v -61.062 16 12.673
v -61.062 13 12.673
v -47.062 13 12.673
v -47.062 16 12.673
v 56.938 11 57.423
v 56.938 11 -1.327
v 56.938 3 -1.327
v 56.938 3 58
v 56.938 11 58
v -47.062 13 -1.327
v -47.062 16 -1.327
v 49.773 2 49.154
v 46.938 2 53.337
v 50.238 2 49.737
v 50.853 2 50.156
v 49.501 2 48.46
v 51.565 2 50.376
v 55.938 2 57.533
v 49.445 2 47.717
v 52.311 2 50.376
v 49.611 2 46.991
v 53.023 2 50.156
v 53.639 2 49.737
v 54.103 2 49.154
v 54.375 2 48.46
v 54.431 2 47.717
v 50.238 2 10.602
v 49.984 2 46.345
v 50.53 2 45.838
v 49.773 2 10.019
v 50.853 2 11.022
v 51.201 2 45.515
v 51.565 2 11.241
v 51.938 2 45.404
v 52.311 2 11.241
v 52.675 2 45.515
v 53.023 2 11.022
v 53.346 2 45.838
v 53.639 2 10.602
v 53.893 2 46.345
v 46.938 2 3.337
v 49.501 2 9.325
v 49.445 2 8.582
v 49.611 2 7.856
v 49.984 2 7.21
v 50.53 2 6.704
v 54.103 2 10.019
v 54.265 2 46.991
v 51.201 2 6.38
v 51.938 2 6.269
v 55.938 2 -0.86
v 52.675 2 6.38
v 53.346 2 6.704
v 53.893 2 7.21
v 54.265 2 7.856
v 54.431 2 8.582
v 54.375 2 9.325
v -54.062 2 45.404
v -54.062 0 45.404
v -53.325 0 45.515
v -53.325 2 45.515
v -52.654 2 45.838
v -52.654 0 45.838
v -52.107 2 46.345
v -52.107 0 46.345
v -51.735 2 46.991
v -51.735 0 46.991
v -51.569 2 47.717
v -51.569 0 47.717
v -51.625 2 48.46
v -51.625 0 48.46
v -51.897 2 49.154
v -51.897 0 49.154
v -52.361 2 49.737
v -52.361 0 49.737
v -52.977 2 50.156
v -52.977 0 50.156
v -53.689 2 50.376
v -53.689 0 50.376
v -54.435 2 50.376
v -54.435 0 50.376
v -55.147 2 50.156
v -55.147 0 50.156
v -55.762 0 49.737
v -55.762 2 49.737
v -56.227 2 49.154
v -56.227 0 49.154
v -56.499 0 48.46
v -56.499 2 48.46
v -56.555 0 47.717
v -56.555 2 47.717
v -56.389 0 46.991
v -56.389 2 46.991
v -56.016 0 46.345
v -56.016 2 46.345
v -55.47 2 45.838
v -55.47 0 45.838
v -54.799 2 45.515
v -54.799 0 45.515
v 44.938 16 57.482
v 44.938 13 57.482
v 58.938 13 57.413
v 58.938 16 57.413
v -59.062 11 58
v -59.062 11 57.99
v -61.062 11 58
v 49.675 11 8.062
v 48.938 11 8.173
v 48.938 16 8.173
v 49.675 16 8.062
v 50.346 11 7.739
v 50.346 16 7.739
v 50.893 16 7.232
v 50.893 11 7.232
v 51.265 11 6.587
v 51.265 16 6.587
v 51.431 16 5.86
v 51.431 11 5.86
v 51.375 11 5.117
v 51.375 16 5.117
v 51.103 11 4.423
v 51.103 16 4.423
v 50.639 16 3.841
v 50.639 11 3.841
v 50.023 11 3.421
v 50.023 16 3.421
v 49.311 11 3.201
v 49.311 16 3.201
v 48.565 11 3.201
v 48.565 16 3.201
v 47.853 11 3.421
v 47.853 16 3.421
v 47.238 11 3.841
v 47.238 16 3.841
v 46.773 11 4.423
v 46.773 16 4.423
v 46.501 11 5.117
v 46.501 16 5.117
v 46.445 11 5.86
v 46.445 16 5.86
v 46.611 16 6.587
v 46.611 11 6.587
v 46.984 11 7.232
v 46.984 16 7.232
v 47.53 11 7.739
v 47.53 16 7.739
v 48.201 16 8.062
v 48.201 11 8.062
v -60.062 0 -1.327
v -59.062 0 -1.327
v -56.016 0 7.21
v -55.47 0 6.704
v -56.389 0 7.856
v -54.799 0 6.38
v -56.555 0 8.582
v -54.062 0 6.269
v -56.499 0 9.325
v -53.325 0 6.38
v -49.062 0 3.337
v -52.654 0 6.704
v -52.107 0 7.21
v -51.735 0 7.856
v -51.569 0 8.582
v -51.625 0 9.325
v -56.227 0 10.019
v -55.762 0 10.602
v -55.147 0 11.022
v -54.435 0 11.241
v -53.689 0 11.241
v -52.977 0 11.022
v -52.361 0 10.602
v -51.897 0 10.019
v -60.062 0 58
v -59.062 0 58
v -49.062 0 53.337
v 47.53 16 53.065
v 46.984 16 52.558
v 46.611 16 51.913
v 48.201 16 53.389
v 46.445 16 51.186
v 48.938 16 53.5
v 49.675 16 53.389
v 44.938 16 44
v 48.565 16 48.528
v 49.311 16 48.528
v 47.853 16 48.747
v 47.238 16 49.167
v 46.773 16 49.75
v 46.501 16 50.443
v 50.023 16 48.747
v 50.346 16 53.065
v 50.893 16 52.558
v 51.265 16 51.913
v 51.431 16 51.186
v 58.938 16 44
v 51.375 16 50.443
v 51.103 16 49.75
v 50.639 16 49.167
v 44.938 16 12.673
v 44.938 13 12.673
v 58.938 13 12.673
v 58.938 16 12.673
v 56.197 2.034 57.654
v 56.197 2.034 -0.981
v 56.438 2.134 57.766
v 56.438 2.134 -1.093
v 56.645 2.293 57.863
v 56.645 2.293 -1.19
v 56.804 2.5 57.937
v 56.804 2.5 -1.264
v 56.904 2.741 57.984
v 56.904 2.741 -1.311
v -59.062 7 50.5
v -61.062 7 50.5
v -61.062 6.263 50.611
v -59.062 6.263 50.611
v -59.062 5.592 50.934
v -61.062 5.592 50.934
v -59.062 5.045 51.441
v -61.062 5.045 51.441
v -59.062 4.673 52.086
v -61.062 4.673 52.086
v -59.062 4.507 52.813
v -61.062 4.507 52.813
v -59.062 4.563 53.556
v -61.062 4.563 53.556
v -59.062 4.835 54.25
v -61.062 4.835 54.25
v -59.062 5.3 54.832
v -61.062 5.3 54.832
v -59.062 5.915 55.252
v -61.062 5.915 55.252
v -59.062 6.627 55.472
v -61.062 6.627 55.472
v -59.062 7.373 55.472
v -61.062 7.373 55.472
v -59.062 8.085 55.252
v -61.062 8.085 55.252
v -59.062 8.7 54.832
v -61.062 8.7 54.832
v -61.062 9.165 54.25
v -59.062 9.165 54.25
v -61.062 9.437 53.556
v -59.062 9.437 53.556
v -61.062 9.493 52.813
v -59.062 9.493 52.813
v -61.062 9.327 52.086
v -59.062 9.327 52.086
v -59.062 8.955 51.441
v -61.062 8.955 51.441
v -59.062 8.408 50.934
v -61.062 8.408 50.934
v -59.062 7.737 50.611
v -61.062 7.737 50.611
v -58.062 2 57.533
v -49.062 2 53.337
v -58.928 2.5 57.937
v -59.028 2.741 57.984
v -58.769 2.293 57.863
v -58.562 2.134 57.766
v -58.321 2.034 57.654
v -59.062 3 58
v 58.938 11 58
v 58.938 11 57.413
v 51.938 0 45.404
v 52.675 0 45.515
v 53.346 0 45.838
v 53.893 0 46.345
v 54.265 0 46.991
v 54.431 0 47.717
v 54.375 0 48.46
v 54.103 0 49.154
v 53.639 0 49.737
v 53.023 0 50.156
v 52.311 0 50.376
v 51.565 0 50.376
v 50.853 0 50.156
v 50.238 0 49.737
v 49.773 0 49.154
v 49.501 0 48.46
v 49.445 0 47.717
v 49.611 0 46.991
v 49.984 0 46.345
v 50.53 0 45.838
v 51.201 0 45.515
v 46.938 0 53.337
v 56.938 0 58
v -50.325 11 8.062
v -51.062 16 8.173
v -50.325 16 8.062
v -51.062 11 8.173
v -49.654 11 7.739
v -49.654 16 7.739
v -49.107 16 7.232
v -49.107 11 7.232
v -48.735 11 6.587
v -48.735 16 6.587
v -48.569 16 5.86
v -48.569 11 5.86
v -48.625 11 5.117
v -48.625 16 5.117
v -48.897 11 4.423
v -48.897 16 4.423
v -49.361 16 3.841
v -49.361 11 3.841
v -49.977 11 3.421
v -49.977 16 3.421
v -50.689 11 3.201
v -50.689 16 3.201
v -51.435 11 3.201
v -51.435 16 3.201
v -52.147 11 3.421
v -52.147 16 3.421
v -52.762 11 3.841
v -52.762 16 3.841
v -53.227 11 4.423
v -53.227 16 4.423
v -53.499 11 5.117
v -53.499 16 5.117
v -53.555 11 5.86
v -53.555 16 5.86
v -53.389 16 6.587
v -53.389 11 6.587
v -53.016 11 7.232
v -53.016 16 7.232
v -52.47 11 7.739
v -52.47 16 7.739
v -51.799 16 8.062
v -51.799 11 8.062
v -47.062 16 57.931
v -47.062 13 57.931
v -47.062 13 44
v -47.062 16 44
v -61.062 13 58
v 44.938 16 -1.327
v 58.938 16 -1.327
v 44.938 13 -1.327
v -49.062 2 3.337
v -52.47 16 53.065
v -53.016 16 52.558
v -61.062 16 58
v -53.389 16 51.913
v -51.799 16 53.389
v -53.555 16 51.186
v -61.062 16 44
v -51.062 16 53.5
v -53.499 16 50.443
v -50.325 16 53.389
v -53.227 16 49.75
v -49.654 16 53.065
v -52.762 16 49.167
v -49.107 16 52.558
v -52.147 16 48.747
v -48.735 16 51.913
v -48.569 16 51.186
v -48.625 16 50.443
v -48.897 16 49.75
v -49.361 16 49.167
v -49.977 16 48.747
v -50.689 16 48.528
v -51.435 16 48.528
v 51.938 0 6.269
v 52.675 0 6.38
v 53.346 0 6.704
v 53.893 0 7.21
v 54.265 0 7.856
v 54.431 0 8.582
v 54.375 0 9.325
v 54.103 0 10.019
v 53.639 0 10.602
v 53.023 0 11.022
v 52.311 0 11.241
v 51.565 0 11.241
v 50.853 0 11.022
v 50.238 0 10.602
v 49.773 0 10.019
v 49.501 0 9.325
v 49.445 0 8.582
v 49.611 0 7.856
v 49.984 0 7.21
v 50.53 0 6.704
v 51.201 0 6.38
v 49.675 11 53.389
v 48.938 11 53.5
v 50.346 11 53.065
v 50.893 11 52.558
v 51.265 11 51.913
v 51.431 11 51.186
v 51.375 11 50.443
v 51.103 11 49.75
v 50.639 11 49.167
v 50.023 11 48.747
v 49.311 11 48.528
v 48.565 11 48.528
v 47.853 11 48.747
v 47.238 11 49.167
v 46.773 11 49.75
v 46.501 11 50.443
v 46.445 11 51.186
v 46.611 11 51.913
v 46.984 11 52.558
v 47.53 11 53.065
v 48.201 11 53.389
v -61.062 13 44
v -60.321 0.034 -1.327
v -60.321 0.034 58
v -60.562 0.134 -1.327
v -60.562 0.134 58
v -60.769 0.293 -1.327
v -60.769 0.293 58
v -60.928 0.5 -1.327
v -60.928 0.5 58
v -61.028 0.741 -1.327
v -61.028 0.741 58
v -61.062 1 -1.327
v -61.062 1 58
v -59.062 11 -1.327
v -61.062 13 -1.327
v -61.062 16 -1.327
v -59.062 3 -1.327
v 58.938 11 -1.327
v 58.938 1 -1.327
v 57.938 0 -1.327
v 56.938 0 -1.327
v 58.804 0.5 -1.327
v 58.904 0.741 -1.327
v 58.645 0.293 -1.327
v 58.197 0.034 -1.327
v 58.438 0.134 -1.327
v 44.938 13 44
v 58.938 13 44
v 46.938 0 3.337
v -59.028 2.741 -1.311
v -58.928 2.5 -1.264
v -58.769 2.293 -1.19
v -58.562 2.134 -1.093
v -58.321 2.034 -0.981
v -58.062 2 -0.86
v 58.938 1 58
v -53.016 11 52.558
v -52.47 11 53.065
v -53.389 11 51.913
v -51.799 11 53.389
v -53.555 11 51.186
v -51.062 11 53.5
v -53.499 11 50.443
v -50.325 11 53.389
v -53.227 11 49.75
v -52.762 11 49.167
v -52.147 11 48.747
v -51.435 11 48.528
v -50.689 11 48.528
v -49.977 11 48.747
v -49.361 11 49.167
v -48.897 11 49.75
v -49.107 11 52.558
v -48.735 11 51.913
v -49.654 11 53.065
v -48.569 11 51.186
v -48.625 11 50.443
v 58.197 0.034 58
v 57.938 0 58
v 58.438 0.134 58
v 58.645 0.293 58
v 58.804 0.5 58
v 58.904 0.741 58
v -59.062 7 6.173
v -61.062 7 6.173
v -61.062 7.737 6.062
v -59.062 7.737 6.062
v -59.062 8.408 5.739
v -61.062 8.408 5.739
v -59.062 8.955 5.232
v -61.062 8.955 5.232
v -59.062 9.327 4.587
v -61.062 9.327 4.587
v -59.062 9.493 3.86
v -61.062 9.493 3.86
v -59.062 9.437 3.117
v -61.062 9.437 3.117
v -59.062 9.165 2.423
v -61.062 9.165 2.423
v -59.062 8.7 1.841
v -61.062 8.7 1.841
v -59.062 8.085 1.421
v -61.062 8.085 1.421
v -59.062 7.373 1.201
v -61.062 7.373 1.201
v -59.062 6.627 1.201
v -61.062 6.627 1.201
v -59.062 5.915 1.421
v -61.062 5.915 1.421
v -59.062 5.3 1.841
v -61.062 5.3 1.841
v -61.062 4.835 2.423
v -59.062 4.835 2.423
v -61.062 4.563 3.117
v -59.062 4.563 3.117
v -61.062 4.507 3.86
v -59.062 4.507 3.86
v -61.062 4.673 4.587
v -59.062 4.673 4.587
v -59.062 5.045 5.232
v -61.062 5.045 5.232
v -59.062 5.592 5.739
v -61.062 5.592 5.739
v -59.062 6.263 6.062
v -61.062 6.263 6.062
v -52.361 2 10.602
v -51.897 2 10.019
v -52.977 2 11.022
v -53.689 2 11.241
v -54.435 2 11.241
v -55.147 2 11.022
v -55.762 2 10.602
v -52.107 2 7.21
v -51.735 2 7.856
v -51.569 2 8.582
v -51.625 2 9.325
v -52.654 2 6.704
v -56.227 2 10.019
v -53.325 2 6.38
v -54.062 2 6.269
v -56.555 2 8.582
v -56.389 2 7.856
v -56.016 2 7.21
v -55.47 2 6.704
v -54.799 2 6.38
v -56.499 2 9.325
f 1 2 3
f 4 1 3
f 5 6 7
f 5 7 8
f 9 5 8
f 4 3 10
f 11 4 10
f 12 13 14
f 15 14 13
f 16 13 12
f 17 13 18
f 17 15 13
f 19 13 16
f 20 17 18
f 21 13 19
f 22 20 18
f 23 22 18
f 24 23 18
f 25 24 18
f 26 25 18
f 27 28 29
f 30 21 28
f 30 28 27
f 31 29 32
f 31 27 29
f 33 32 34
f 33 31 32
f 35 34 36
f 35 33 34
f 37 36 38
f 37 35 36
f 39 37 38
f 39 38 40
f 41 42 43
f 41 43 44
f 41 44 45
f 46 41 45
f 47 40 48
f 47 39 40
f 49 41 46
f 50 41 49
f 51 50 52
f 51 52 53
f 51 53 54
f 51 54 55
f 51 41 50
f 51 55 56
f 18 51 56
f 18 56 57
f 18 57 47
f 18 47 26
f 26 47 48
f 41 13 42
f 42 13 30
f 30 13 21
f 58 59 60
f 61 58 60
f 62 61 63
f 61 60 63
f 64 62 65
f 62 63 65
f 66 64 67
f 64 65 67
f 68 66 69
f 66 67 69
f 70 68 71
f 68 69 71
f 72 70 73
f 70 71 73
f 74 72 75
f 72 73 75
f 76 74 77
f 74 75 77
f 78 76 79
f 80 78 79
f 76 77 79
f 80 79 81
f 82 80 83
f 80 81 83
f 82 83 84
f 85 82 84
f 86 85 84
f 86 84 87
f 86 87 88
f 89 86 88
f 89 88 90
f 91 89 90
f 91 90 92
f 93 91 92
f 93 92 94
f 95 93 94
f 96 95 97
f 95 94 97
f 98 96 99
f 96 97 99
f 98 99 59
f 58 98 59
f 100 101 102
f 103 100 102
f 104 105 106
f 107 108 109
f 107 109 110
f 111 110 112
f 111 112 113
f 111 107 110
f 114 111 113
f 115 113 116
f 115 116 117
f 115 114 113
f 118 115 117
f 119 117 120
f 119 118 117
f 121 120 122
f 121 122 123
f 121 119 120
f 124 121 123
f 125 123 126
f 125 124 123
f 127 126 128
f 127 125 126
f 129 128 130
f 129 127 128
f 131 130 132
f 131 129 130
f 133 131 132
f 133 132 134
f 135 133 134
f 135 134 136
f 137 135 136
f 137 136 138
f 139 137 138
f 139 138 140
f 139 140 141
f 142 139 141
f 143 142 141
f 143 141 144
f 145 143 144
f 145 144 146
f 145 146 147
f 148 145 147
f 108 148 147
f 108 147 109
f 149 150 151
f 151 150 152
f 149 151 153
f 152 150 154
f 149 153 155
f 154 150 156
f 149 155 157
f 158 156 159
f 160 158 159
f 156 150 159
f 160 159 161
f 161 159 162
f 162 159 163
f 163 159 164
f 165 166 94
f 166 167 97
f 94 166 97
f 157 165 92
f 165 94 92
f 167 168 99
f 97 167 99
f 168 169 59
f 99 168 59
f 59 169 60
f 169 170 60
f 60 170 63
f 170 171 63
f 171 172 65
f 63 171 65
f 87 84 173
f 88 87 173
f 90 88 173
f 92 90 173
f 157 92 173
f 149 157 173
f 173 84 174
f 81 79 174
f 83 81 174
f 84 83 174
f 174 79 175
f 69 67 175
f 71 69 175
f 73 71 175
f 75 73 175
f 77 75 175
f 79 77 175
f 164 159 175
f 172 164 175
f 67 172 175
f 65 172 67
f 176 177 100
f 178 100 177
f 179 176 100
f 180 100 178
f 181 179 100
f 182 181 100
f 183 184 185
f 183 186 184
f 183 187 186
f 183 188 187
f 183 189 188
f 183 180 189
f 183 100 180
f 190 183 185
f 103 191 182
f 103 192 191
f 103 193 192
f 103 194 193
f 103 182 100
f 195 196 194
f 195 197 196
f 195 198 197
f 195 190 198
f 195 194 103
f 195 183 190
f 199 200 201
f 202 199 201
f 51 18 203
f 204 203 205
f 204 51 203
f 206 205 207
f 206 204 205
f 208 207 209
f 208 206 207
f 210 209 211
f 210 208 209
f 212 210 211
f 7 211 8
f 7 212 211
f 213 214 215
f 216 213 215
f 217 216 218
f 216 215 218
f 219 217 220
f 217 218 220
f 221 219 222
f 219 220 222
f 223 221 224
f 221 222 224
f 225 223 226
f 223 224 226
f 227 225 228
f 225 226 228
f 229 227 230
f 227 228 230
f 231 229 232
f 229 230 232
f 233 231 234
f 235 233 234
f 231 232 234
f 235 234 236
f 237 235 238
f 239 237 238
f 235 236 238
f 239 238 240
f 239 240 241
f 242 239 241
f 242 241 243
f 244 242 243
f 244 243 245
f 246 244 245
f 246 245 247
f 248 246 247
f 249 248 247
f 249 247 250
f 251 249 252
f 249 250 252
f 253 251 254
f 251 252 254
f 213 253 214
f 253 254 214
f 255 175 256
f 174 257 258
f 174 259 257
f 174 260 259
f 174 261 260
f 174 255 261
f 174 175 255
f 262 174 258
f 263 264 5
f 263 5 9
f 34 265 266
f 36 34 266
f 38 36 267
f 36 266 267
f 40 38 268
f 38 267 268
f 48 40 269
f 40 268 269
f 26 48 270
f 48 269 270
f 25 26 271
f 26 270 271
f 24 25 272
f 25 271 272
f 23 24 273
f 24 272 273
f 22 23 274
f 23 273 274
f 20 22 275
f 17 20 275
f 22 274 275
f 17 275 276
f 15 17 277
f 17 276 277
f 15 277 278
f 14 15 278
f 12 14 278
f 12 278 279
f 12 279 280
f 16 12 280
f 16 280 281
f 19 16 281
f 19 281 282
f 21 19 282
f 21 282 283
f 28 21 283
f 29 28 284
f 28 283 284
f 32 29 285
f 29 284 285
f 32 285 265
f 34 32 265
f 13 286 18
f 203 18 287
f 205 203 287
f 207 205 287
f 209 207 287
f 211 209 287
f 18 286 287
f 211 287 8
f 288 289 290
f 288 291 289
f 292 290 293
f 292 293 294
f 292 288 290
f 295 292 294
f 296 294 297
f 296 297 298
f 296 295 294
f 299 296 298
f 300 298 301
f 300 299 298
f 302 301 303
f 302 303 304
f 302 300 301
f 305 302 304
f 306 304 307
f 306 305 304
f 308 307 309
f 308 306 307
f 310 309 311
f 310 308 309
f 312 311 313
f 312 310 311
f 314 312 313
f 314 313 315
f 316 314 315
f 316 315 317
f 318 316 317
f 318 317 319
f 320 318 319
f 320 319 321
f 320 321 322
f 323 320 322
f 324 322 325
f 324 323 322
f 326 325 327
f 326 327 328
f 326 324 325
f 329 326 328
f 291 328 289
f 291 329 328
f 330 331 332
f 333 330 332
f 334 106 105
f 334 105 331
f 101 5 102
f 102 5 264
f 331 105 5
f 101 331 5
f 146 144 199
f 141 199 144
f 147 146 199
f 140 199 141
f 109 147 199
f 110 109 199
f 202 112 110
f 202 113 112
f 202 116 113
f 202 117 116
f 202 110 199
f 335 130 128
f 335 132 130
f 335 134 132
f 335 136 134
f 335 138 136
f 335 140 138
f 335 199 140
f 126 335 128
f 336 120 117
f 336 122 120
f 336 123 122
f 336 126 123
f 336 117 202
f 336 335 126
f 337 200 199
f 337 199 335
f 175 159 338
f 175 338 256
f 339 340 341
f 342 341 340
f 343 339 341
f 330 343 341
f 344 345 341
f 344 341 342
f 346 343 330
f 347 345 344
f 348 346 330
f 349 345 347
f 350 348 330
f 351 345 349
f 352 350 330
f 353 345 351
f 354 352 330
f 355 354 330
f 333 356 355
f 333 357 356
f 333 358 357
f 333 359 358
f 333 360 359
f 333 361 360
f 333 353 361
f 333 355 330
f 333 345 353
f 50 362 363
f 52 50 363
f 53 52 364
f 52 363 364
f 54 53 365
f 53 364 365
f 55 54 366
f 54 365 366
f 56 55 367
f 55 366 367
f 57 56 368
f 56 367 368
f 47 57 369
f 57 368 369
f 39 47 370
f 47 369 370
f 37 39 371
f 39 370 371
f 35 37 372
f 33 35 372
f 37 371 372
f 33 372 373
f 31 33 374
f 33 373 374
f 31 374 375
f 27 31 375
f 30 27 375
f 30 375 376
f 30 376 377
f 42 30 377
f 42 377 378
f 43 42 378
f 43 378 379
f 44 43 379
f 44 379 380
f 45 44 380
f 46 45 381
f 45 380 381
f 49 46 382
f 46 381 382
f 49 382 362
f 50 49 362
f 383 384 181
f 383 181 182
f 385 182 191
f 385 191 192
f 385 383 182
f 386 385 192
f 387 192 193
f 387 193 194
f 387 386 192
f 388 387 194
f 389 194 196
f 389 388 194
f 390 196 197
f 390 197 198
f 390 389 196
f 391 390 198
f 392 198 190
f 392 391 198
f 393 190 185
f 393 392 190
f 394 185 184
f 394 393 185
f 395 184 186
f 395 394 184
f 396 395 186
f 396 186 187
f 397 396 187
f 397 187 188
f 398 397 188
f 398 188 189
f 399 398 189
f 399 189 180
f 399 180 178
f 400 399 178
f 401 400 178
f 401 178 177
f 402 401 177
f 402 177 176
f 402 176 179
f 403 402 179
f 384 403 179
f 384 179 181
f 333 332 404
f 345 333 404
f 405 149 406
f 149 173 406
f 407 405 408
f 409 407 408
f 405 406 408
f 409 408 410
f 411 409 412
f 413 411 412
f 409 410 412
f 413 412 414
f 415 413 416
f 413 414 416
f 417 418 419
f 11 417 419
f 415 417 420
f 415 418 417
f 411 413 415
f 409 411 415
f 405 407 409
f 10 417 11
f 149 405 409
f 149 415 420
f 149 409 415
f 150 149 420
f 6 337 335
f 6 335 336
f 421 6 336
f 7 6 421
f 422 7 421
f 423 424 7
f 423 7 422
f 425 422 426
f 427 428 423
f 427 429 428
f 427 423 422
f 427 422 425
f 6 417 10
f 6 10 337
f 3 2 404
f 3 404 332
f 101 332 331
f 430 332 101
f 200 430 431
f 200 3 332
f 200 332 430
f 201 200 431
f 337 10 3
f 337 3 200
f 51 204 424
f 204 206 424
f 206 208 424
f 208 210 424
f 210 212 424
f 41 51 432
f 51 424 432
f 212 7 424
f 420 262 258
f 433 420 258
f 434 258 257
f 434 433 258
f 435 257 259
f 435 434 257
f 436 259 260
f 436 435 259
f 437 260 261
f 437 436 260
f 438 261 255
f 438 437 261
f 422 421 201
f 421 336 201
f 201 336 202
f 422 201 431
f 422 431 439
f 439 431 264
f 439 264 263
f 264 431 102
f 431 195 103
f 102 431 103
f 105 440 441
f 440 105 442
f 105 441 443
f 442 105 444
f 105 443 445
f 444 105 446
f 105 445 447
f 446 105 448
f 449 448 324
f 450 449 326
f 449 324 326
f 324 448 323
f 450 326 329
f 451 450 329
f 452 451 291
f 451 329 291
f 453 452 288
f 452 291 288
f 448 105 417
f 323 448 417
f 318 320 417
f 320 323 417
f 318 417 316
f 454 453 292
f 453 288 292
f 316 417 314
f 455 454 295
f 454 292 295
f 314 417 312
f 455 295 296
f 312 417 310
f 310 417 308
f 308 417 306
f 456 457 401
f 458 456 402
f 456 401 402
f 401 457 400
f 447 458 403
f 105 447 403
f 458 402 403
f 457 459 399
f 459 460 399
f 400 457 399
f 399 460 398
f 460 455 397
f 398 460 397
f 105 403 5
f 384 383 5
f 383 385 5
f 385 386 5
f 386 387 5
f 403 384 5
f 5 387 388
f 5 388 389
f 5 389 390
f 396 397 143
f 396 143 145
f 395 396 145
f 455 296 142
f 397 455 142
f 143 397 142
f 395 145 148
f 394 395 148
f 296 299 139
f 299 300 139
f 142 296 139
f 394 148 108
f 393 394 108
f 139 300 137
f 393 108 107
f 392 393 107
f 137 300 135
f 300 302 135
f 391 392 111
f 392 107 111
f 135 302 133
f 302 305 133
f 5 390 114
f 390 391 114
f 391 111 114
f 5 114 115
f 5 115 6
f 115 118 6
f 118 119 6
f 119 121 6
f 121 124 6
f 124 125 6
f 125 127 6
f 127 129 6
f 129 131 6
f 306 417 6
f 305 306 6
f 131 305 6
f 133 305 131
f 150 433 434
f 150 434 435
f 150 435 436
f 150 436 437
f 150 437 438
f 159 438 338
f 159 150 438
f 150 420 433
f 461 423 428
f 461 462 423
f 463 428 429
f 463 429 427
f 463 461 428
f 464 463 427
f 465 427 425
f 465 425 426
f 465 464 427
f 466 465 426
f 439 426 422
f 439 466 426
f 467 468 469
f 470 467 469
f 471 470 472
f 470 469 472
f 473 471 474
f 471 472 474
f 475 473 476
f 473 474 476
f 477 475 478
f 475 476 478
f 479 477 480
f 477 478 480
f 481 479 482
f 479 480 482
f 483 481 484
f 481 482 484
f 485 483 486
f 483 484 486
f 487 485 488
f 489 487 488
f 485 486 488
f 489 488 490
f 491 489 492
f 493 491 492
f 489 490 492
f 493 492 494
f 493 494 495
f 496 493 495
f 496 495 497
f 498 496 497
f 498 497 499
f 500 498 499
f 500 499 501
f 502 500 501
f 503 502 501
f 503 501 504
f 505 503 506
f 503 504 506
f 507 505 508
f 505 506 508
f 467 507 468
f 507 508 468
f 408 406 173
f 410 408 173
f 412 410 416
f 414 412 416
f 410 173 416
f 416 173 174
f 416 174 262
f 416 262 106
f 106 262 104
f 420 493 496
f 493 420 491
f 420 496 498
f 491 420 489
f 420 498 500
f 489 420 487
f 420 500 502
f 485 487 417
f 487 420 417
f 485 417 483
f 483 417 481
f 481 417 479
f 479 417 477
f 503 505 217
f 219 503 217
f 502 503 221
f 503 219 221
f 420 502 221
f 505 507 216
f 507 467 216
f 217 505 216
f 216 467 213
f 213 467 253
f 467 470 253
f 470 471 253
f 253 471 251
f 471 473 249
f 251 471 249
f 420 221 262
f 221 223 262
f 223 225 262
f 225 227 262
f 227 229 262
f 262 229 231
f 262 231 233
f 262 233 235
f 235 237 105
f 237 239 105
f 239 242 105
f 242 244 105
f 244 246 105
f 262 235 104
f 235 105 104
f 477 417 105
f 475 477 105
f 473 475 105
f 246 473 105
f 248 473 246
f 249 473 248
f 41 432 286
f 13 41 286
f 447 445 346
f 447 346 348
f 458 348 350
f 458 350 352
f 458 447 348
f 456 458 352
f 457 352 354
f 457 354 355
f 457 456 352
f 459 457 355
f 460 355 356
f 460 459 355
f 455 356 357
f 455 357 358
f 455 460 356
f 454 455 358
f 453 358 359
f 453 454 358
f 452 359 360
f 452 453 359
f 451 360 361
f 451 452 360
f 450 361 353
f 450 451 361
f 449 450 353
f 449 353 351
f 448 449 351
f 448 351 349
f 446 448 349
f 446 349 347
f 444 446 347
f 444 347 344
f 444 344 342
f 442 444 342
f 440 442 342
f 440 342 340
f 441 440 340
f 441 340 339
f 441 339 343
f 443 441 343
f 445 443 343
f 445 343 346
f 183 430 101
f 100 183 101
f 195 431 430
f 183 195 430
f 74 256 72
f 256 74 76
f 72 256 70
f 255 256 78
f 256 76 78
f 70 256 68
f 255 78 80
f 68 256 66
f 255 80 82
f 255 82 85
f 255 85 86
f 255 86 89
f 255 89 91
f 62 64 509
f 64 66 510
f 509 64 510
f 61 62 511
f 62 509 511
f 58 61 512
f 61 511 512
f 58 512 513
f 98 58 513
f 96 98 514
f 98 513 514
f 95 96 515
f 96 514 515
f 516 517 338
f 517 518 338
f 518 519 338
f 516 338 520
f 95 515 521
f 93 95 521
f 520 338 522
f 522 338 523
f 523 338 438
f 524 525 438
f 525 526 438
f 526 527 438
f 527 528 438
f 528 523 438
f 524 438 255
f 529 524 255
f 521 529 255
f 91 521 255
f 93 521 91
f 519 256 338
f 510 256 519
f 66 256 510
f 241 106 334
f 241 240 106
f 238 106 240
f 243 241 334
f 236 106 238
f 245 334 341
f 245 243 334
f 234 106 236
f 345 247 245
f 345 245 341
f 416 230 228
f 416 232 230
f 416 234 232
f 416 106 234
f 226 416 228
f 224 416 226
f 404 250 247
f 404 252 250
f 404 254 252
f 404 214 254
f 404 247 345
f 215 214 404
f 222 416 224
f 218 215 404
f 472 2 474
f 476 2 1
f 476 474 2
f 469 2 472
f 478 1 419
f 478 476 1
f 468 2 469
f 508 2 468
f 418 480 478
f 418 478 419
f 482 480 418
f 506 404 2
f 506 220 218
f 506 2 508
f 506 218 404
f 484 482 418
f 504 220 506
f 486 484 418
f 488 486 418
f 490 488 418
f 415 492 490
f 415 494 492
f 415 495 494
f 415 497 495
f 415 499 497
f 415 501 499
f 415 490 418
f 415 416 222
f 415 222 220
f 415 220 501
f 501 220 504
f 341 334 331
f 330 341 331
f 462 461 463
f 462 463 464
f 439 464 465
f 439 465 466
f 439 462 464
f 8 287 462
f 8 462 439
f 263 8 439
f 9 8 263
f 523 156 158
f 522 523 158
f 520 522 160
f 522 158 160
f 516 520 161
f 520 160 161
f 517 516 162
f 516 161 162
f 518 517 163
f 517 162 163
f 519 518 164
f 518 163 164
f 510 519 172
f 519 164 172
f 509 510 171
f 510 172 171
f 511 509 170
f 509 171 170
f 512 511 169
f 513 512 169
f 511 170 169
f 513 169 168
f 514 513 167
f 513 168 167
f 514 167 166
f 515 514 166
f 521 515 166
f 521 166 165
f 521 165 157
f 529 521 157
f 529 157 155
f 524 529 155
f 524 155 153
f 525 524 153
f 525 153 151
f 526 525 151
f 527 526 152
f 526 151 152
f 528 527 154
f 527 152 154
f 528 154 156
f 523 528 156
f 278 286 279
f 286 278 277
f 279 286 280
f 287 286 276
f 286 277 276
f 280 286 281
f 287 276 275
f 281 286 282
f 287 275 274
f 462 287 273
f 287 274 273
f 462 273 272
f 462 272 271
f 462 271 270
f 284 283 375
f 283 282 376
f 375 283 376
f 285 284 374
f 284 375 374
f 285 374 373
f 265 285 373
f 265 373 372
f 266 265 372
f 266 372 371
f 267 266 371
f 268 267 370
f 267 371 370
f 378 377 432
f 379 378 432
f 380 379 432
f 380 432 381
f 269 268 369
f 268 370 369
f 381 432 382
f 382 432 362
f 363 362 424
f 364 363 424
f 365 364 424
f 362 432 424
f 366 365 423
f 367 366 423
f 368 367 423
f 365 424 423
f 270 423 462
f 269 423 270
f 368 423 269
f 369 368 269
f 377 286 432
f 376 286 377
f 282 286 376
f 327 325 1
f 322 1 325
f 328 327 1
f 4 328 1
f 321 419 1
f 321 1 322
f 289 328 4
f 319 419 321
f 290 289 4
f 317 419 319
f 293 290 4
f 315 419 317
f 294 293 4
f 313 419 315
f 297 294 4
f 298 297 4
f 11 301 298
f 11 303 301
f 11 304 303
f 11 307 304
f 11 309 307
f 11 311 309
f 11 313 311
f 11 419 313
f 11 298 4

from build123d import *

# Parameters (mm, degrees)
BOSS_EXTRUDE1_DEPTH = 2
SKETCH2_W           = 59.326153163
SKETCH2_H           = 11
BOSS_EXTRUDE2_DEPTH = 2
FILLET1_R           = 1
SKETCH3_R           = 2.5
BOSS_EXTRUDE3_DEPTH = 2
FILLET3_R           = 1
SKETCH4_R           = 2.5
CUT_EXTRUDE1_DEPTH  = 2
BOSS_EXTRUDE5_START = 2
SKETCH3_5_W         = 14
SKETCH3_5_H         = 14
SKETCH3_5_R         = 2.5
BOSS_EXTRUDE5_DEPTH = 3
SKETCH5_R           = 2.5
CUT_EXTRUDE2_DEPTH  = 2


with BuildPart() as part:
    # Sketch1 → Boss-Extrude1 (new body)
    with BuildSketch(Plane(origin=(0, 0, 0), x_dir=(1, 0, 0), z_dir=(0, 1, 0))):
        Polygon((-49.061898328, -3.336557388), (-49.061898328, -53.336557388), (-59.061898328, -57.999633969), (-59.061898328, 1.326519194), align=None)
    boss_extrude1 = extrude(amount=BOSS_EXTRUDE1_DEPTH)

    # Sketch2 → Boss-Extrude2 (add)
    with BuildSketch(Plane.ZY.offset(59.061898328)):
        with Locations((28.336557388, 5.5)):
            Rectangle(SKETCH2_W, SKETCH2_H)
    boss_extrude2 = extrude(amount=BOSS_EXTRUDE2_DEPTH)

    # Fillet1
    fillet1_edges = [part.edges().sort_by_distance(p)[0] for p in [
        (-61.061898328, 0, 28.336557388),
        (-59.061898328, 2, 28.336557388),
    ]]
    fillet(fillet1_edges, radius=FILLET1_R)

    # Sketch3 → Boss-Extrude3 (add)
    with BuildSketch(Plane(origin=(0, 11, 0), x_dir=(1, 0, 0), z_dir=(0, 1, 0))):
        Polygon((-61.061898328, 1.326519194), (-61.061898328, -57.999633969), (58.938101672, -57.413440129), (58.938101672, 1.326519194), align=None)
        with Locations(Location((-51.061898328, -5.673480806, 0), (0, 0, 270))):
            Circle(SKETCH3_R, mode=Mode.SUBTRACT)
        with Locations(Location((48.938101672, -5.673480806, 0), (0, 0, 270))):
            Circle(SKETCH3_R, mode=Mode.SUBTRACT)
        with Locations(Location((-51.061898328, -50.999633969, 0), (0, 0, 270))):
            Circle(SKETCH3_R, mode=Mode.SUBTRACT)
        with Locations(Location((48.938101672, -50.999633969, 0), (0, 0, 270))):
            Circle(SKETCH3_R, mode=Mode.SUBTRACT)
    extrude(amount=BOSS_EXTRUDE3_DEPTH)

    # Mirror1: Boss-Extrude2 across plane
    add(boss_extrude2.mirror(Plane.ZY.offset(1.061898328)))

    # Mirror2: Boss-Extrude1 across plane
    add(boss_extrude1.mirror(Plane.ZY.offset(1.061898328)))

    # Fillet3
    fillet3_edges = [part.edges().sort_by_distance(p)[0] for p in [
        (58.938101672, 0, 28.336557388),
        (56.938101672, 2, 28.336557388),
    ]]
    fillet(fillet3_edges, radius=FILLET3_R)

    # Sketch4 → Cut-Extrude1 (cut)
    with BuildSketch(Plane.ZY.offset(61.061898328)):
        with Locations((3.673480806, 7)):
            Circle(SKETCH4_R)
        with Locations(Location((52.999633969, 7, 0), (0, 0, 180))):
            Circle(SKETCH4_R)
    extrude(amount=-CUT_EXTRUDE1_DEPTH, mode=Mode.SUBTRACT)

    # Sketch3<5> → Boss-Extrude5 (add)
    # profile 1 of 4: a face of its own
    with BuildSketch(Plane(origin=(0, 11, 0), x_dir=(1, 0, 0), z_dir=(0, 1, 0)).offset(BOSS_EXTRUDE5_START)):
        with Locations((-54.061898328, -5.673480806)):
            Rectangle(SKETCH3_5_W, SKETCH3_5_H)
        with Locations(Location((-51.061898328, -5.673480806, 0), (0, 0, 270))):
            Circle(SKETCH3_5_R, mode=Mode.SUBTRACT)
    # profile 2 of 4: a face of its own
    with BuildSketch(Plane(origin=(0, 11, 0), x_dir=(1, 0, 0), z_dir=(0, 1, 0)).offset(BOSS_EXTRUDE5_START)):
        with Locations((51.938101672, -5.673480806)):
            Rectangle(SKETCH3_5_W, SKETCH3_5_H)
        with Locations(Location((48.938101672, -5.673480806, 0), (0, 0, 270))):
            Circle(SKETCH3_5_R, mode=Mode.SUBTRACT)
    # profile 3 of 4: a face of its own
    with BuildSketch(Plane(origin=(0, 11, 0), x_dir=(1, 0, 0), z_dir=(0, 1, 0)).offset(BOSS_EXTRUDE5_START)):
        Polygon((-47.061898328, -43.999633969), (-61.061898328, -43.999633969), (-61.061898328, -57.999633969), (-47.061898328, -57.931244688), align=None)
        with Locations(Location((-51.061898328, -50.999633969, 0), (0, 0, 270))):
            Circle(SKETCH3_5_R, mode=Mode.SUBTRACT)
    # profile 4 of 4: a face of its own
    with BuildSketch(Plane(origin=(0, 11, 0), x_dir=(1, 0, 0), z_dir=(0, 1, 0)).offset(BOSS_EXTRUDE5_START)):
        Polygon((58.938101672, -57.413440129), (58.938101672, -43.999633969), (44.938101672, -43.999633969), (44.938101672, -57.481829411), align=None)
        with Locations(Location((48.938101672, -50.999633969, 0), (0, 0, 270))):
            Circle(SKETCH3_5_R, mode=Mode.SUBTRACT)
    extrude(amount=BOSS_EXTRUDE5_DEPTH)

    # Sketch5 → Cut-Extrude2 (cut)
    with BuildSketch(Plane.XZ):
        with Locations(Location((-54.061898328, 47.903918034, 0), (0, 0, 270))):
            Circle(SKETCH5_R)
        with Locations(Location((51.938101672, 47.903918034, 0), (0, 0, 270))):
            Circle(SKETCH5_R)
        with Locations(Location((51.938101672, 8.769196741, 0), (0, 0, 270))):
            Circle(SKETCH5_R)
        with Locations(Location((-54.061898328, 8.769196741, 0), (0, 0, 270))):
            Circle(SKETCH5_R)
    extrude(amount=-CUT_EXTRUDE2_DEPTH, mode=Mode.SUBTRACT)


solid = part.part
